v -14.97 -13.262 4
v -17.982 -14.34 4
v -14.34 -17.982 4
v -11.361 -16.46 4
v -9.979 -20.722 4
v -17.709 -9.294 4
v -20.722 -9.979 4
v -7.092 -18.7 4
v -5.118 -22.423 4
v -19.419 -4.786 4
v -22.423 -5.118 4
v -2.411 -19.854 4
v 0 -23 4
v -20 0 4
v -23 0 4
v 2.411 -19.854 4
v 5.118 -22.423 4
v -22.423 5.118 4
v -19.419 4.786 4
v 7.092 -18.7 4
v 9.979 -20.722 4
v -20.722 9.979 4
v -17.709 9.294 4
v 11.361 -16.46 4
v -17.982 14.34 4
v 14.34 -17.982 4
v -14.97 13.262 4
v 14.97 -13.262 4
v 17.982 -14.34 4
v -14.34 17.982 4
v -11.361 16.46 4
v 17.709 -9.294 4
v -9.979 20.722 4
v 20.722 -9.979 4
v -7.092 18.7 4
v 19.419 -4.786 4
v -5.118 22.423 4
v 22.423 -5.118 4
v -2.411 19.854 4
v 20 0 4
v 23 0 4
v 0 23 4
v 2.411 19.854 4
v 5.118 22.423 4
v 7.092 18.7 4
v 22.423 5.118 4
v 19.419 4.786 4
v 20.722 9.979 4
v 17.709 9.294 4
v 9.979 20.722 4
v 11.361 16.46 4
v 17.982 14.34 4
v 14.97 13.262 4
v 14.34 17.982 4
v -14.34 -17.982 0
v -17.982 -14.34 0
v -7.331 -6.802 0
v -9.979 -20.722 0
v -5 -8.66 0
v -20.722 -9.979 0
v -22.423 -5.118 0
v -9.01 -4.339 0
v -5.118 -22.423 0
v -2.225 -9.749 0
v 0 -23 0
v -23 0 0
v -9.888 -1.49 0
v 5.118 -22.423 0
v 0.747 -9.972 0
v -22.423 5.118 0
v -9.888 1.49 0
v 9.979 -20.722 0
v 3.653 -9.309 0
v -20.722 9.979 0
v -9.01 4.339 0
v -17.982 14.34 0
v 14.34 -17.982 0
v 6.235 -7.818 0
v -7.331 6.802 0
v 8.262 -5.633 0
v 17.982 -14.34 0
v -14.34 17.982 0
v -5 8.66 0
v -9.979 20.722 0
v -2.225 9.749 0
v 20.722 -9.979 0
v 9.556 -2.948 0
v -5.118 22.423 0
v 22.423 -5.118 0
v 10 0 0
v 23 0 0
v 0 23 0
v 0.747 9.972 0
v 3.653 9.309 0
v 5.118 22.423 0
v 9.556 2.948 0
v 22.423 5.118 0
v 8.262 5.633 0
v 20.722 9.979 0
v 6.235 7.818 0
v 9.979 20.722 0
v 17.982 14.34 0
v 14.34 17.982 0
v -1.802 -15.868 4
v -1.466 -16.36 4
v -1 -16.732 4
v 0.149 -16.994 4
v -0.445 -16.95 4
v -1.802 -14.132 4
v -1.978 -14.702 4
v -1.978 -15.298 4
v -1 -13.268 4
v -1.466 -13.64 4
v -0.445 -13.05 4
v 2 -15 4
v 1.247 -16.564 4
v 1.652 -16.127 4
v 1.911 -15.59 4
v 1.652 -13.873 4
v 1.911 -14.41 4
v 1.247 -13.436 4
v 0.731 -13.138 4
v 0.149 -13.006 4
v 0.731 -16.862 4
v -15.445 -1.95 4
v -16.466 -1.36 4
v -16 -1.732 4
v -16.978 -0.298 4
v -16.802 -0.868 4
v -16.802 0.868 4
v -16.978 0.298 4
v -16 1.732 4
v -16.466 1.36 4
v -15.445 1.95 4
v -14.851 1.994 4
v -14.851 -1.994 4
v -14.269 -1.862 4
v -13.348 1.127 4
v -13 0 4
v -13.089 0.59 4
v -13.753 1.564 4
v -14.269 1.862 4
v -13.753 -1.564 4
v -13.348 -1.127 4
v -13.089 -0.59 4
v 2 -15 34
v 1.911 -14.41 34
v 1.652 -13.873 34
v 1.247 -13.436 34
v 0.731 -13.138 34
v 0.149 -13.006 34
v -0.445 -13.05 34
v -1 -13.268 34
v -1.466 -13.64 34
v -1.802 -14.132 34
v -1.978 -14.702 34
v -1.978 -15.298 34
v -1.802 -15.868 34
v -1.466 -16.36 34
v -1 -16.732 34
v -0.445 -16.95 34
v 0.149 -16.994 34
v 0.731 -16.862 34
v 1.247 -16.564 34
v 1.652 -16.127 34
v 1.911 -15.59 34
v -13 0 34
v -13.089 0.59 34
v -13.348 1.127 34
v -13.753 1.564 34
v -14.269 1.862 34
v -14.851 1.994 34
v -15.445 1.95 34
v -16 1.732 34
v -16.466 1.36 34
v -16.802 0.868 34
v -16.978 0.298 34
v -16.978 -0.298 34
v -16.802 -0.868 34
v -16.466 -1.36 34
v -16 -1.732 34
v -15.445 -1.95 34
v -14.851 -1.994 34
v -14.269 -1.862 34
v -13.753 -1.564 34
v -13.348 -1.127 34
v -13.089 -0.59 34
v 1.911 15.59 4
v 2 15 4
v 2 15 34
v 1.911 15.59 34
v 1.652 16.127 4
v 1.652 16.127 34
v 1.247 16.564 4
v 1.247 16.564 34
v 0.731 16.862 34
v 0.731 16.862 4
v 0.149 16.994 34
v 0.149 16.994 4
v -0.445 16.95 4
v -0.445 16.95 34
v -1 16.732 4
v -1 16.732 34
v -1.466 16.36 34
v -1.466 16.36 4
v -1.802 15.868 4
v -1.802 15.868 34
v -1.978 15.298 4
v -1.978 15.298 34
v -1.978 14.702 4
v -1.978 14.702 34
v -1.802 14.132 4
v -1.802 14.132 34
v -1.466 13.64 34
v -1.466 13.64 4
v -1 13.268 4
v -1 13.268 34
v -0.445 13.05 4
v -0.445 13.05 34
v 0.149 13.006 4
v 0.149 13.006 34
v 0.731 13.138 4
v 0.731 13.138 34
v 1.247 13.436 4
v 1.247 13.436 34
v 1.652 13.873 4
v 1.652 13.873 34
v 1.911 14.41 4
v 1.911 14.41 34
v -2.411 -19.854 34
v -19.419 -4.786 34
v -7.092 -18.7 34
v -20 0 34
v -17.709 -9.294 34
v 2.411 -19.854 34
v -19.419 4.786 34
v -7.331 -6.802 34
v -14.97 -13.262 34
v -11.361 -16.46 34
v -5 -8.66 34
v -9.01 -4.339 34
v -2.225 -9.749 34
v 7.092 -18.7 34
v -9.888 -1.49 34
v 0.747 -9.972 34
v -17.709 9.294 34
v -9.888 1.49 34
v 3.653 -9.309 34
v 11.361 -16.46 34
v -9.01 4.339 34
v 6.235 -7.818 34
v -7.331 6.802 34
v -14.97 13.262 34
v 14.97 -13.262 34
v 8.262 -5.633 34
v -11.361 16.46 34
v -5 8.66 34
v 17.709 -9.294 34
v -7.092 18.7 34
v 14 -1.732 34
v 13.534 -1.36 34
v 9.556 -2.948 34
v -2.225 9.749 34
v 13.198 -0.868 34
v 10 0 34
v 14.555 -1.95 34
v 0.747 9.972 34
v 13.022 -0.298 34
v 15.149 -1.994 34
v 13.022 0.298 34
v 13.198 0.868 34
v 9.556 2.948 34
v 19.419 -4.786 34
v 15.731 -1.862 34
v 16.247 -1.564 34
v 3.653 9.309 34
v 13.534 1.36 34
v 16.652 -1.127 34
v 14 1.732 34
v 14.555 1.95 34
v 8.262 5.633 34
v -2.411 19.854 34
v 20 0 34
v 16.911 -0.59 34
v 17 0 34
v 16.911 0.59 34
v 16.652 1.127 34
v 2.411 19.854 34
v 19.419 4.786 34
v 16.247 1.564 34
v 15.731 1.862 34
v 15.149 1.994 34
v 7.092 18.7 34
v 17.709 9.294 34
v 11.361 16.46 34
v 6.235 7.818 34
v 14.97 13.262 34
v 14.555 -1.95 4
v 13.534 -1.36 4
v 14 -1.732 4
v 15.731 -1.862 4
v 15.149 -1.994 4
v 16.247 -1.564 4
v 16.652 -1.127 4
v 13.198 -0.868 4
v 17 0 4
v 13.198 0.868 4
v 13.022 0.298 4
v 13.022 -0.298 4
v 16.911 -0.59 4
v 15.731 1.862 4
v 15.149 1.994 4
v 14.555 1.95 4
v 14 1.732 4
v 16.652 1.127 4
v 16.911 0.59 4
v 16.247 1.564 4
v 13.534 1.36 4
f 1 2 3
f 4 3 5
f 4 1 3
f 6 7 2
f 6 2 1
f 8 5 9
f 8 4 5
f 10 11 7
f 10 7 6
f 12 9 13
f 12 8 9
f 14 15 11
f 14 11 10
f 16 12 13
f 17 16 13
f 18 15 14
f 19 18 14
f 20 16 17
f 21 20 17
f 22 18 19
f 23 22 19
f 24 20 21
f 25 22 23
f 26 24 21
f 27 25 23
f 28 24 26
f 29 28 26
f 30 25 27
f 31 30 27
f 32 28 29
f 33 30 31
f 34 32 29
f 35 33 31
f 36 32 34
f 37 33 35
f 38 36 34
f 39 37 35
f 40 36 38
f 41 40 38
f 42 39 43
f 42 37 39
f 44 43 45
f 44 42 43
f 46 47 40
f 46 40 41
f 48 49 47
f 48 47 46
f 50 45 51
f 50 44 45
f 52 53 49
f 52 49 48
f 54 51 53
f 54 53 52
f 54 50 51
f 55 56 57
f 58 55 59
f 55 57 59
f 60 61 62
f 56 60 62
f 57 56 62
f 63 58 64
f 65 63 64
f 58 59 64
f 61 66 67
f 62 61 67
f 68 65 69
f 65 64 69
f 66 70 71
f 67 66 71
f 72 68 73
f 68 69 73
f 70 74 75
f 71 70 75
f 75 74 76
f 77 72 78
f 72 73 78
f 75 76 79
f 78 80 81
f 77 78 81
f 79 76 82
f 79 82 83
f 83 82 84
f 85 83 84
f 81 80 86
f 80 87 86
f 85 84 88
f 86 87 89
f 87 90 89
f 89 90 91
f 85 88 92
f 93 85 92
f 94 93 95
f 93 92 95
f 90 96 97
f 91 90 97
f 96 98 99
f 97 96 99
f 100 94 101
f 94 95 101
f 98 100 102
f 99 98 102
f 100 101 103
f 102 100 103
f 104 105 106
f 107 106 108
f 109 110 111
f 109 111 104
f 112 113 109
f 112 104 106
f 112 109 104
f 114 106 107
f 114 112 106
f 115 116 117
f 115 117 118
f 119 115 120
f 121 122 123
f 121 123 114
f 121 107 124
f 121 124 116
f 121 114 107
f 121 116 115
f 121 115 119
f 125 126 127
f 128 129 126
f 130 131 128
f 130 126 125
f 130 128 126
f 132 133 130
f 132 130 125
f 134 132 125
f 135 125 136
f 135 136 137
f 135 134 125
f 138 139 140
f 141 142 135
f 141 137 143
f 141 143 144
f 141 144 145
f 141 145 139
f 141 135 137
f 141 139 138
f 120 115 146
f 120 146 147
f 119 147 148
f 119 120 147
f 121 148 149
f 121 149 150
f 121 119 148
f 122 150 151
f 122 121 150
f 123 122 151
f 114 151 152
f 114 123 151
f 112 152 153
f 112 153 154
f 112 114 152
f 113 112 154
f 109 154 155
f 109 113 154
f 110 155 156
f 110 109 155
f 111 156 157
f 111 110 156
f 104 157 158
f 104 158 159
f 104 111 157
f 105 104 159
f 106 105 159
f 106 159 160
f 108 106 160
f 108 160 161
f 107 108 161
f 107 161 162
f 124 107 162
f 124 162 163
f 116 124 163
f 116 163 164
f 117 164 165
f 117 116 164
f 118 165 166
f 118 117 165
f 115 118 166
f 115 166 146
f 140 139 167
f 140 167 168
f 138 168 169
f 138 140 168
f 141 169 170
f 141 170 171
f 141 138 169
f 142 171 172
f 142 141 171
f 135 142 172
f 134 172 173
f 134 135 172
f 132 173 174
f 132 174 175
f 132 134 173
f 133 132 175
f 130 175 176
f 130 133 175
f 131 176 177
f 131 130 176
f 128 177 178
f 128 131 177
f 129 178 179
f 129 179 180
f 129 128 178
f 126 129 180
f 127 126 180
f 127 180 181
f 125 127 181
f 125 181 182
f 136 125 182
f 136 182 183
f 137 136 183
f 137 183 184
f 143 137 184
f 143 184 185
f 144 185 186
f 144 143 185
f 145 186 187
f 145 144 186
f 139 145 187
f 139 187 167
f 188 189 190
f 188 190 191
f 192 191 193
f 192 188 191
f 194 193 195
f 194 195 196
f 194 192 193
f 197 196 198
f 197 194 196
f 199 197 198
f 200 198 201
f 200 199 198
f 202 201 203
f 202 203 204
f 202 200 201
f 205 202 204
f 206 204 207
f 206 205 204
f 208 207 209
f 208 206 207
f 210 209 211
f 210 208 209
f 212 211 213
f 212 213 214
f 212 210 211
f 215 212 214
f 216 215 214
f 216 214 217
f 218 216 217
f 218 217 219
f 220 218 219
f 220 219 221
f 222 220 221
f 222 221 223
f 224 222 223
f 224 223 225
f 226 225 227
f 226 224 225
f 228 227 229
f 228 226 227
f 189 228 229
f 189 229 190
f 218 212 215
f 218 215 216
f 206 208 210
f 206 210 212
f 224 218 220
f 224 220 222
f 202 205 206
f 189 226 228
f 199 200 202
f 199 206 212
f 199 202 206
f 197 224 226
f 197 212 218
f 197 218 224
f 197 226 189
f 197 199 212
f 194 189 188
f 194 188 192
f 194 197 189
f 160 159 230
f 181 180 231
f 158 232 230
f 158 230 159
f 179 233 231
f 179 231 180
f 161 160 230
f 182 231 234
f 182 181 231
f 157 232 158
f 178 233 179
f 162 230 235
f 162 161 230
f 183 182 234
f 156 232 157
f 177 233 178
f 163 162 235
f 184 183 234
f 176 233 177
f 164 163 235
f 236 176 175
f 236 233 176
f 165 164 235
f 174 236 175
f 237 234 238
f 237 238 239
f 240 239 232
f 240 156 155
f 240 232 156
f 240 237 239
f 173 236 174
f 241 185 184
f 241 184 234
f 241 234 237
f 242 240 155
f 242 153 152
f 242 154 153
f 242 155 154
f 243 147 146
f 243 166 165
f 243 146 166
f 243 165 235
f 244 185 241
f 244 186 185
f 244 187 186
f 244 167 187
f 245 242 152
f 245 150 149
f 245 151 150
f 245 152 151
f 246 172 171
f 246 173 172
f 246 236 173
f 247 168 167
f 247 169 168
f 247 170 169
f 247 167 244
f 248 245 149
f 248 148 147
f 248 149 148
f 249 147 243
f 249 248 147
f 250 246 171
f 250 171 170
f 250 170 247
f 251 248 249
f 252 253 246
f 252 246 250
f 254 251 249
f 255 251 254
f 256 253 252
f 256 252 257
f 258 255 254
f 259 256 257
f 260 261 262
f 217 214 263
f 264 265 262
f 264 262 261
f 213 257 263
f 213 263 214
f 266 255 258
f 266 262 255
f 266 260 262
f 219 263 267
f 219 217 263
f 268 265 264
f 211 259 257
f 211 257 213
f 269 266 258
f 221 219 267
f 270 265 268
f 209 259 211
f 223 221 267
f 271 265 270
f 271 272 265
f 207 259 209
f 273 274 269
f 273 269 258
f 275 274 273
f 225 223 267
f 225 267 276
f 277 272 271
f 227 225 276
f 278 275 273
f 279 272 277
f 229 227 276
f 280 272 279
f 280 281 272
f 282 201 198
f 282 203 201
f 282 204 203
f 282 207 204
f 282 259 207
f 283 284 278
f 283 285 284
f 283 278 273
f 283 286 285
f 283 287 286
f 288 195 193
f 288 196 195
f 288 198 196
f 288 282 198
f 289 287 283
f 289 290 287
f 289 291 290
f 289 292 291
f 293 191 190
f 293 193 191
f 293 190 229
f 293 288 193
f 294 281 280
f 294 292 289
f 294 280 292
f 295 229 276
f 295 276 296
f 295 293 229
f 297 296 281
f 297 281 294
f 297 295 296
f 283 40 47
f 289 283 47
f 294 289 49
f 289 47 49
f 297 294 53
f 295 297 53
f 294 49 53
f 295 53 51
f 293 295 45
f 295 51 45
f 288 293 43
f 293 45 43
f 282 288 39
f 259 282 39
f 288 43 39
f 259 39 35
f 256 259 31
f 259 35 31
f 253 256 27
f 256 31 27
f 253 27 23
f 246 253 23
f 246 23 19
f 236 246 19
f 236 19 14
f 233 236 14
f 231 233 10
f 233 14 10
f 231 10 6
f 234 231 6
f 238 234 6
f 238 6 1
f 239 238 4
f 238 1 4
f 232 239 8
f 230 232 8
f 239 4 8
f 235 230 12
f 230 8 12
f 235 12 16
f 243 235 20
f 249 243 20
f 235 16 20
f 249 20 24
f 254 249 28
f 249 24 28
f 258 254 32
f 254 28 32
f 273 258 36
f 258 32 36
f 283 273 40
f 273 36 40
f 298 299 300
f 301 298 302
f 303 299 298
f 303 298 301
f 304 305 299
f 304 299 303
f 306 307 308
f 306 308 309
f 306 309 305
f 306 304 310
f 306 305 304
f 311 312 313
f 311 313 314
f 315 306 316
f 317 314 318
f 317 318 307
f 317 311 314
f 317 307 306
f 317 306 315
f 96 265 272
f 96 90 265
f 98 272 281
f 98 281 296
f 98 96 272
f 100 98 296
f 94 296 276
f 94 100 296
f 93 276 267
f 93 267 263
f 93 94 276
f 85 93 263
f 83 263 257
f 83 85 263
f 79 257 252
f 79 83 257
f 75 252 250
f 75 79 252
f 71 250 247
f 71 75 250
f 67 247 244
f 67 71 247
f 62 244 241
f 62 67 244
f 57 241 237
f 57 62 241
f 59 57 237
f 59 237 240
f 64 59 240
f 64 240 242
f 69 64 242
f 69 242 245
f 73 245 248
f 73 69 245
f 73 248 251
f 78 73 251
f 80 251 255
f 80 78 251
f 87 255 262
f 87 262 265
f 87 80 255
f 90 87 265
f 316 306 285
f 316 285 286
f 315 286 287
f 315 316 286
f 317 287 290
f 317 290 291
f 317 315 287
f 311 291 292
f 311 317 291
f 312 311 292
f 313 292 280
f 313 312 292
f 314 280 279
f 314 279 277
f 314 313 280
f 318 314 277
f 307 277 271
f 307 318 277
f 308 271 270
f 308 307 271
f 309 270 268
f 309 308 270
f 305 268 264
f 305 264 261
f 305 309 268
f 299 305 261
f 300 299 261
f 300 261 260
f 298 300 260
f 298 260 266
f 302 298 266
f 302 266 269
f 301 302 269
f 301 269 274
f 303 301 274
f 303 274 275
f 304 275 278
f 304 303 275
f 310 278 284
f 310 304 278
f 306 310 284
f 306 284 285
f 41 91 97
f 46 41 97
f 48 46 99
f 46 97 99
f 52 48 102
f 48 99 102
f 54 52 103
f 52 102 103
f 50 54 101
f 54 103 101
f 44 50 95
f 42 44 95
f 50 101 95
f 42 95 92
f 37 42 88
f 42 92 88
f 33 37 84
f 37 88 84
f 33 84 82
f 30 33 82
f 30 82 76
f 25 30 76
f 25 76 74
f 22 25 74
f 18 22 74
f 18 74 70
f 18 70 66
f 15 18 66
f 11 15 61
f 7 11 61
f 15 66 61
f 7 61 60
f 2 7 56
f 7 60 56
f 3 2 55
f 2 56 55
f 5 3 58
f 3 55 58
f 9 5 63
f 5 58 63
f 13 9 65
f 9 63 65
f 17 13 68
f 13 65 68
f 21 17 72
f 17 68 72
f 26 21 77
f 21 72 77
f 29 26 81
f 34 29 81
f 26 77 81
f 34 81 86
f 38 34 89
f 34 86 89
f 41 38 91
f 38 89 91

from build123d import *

# Parameters (mm, degrees)
SKETCH1_R           = 23
SKETCH1_R_2         = 10
BOSS_EXTRUDE1_DEPTH = 4
SKETCH2_R           = 20
SKETCH2_R_2         = 10
SKETCH2_R_3         = 2
BOSS_EXTRUDE2_DEPTH = 30


with BuildPart() as part:
    # Sketch1 → Boss-Extrude1 (new body)
    with BuildSketch(Plane.XY):
        Circle(SKETCH1_R)
        Circle(SKETCH1_R_2, mode=Mode.SUBTRACT)
    extrude(amount=BOSS_EXTRUDE1_DEPTH)

    # Sketch2 → Boss-Extrude2 (add)
    with BuildSketch(Plane.XY.offset(4)):
        Circle(SKETCH2_R)
        Circle(SKETCH2_R_2, mode=Mode.SUBTRACT)
        with Locations((0, 15)):
            Circle(SKETCH2_R_3, mode=Mode.SUBTRACT)
        with Locations((15, 0)):
            Circle(SKETCH2_R_3, mode=Mode.SUBTRACT)
        with Locations((0, -15)):
            Circle(SKETCH2_R_3, mode=Mode.SUBTRACT)
        with Locations((-15, 0)):
            Circle(SKETCH2_R_3, mode=Mode.SUBTRACT)
    extrude(amount=BOSS_EXTRUDE2_DEPTH)


solid = part.part
